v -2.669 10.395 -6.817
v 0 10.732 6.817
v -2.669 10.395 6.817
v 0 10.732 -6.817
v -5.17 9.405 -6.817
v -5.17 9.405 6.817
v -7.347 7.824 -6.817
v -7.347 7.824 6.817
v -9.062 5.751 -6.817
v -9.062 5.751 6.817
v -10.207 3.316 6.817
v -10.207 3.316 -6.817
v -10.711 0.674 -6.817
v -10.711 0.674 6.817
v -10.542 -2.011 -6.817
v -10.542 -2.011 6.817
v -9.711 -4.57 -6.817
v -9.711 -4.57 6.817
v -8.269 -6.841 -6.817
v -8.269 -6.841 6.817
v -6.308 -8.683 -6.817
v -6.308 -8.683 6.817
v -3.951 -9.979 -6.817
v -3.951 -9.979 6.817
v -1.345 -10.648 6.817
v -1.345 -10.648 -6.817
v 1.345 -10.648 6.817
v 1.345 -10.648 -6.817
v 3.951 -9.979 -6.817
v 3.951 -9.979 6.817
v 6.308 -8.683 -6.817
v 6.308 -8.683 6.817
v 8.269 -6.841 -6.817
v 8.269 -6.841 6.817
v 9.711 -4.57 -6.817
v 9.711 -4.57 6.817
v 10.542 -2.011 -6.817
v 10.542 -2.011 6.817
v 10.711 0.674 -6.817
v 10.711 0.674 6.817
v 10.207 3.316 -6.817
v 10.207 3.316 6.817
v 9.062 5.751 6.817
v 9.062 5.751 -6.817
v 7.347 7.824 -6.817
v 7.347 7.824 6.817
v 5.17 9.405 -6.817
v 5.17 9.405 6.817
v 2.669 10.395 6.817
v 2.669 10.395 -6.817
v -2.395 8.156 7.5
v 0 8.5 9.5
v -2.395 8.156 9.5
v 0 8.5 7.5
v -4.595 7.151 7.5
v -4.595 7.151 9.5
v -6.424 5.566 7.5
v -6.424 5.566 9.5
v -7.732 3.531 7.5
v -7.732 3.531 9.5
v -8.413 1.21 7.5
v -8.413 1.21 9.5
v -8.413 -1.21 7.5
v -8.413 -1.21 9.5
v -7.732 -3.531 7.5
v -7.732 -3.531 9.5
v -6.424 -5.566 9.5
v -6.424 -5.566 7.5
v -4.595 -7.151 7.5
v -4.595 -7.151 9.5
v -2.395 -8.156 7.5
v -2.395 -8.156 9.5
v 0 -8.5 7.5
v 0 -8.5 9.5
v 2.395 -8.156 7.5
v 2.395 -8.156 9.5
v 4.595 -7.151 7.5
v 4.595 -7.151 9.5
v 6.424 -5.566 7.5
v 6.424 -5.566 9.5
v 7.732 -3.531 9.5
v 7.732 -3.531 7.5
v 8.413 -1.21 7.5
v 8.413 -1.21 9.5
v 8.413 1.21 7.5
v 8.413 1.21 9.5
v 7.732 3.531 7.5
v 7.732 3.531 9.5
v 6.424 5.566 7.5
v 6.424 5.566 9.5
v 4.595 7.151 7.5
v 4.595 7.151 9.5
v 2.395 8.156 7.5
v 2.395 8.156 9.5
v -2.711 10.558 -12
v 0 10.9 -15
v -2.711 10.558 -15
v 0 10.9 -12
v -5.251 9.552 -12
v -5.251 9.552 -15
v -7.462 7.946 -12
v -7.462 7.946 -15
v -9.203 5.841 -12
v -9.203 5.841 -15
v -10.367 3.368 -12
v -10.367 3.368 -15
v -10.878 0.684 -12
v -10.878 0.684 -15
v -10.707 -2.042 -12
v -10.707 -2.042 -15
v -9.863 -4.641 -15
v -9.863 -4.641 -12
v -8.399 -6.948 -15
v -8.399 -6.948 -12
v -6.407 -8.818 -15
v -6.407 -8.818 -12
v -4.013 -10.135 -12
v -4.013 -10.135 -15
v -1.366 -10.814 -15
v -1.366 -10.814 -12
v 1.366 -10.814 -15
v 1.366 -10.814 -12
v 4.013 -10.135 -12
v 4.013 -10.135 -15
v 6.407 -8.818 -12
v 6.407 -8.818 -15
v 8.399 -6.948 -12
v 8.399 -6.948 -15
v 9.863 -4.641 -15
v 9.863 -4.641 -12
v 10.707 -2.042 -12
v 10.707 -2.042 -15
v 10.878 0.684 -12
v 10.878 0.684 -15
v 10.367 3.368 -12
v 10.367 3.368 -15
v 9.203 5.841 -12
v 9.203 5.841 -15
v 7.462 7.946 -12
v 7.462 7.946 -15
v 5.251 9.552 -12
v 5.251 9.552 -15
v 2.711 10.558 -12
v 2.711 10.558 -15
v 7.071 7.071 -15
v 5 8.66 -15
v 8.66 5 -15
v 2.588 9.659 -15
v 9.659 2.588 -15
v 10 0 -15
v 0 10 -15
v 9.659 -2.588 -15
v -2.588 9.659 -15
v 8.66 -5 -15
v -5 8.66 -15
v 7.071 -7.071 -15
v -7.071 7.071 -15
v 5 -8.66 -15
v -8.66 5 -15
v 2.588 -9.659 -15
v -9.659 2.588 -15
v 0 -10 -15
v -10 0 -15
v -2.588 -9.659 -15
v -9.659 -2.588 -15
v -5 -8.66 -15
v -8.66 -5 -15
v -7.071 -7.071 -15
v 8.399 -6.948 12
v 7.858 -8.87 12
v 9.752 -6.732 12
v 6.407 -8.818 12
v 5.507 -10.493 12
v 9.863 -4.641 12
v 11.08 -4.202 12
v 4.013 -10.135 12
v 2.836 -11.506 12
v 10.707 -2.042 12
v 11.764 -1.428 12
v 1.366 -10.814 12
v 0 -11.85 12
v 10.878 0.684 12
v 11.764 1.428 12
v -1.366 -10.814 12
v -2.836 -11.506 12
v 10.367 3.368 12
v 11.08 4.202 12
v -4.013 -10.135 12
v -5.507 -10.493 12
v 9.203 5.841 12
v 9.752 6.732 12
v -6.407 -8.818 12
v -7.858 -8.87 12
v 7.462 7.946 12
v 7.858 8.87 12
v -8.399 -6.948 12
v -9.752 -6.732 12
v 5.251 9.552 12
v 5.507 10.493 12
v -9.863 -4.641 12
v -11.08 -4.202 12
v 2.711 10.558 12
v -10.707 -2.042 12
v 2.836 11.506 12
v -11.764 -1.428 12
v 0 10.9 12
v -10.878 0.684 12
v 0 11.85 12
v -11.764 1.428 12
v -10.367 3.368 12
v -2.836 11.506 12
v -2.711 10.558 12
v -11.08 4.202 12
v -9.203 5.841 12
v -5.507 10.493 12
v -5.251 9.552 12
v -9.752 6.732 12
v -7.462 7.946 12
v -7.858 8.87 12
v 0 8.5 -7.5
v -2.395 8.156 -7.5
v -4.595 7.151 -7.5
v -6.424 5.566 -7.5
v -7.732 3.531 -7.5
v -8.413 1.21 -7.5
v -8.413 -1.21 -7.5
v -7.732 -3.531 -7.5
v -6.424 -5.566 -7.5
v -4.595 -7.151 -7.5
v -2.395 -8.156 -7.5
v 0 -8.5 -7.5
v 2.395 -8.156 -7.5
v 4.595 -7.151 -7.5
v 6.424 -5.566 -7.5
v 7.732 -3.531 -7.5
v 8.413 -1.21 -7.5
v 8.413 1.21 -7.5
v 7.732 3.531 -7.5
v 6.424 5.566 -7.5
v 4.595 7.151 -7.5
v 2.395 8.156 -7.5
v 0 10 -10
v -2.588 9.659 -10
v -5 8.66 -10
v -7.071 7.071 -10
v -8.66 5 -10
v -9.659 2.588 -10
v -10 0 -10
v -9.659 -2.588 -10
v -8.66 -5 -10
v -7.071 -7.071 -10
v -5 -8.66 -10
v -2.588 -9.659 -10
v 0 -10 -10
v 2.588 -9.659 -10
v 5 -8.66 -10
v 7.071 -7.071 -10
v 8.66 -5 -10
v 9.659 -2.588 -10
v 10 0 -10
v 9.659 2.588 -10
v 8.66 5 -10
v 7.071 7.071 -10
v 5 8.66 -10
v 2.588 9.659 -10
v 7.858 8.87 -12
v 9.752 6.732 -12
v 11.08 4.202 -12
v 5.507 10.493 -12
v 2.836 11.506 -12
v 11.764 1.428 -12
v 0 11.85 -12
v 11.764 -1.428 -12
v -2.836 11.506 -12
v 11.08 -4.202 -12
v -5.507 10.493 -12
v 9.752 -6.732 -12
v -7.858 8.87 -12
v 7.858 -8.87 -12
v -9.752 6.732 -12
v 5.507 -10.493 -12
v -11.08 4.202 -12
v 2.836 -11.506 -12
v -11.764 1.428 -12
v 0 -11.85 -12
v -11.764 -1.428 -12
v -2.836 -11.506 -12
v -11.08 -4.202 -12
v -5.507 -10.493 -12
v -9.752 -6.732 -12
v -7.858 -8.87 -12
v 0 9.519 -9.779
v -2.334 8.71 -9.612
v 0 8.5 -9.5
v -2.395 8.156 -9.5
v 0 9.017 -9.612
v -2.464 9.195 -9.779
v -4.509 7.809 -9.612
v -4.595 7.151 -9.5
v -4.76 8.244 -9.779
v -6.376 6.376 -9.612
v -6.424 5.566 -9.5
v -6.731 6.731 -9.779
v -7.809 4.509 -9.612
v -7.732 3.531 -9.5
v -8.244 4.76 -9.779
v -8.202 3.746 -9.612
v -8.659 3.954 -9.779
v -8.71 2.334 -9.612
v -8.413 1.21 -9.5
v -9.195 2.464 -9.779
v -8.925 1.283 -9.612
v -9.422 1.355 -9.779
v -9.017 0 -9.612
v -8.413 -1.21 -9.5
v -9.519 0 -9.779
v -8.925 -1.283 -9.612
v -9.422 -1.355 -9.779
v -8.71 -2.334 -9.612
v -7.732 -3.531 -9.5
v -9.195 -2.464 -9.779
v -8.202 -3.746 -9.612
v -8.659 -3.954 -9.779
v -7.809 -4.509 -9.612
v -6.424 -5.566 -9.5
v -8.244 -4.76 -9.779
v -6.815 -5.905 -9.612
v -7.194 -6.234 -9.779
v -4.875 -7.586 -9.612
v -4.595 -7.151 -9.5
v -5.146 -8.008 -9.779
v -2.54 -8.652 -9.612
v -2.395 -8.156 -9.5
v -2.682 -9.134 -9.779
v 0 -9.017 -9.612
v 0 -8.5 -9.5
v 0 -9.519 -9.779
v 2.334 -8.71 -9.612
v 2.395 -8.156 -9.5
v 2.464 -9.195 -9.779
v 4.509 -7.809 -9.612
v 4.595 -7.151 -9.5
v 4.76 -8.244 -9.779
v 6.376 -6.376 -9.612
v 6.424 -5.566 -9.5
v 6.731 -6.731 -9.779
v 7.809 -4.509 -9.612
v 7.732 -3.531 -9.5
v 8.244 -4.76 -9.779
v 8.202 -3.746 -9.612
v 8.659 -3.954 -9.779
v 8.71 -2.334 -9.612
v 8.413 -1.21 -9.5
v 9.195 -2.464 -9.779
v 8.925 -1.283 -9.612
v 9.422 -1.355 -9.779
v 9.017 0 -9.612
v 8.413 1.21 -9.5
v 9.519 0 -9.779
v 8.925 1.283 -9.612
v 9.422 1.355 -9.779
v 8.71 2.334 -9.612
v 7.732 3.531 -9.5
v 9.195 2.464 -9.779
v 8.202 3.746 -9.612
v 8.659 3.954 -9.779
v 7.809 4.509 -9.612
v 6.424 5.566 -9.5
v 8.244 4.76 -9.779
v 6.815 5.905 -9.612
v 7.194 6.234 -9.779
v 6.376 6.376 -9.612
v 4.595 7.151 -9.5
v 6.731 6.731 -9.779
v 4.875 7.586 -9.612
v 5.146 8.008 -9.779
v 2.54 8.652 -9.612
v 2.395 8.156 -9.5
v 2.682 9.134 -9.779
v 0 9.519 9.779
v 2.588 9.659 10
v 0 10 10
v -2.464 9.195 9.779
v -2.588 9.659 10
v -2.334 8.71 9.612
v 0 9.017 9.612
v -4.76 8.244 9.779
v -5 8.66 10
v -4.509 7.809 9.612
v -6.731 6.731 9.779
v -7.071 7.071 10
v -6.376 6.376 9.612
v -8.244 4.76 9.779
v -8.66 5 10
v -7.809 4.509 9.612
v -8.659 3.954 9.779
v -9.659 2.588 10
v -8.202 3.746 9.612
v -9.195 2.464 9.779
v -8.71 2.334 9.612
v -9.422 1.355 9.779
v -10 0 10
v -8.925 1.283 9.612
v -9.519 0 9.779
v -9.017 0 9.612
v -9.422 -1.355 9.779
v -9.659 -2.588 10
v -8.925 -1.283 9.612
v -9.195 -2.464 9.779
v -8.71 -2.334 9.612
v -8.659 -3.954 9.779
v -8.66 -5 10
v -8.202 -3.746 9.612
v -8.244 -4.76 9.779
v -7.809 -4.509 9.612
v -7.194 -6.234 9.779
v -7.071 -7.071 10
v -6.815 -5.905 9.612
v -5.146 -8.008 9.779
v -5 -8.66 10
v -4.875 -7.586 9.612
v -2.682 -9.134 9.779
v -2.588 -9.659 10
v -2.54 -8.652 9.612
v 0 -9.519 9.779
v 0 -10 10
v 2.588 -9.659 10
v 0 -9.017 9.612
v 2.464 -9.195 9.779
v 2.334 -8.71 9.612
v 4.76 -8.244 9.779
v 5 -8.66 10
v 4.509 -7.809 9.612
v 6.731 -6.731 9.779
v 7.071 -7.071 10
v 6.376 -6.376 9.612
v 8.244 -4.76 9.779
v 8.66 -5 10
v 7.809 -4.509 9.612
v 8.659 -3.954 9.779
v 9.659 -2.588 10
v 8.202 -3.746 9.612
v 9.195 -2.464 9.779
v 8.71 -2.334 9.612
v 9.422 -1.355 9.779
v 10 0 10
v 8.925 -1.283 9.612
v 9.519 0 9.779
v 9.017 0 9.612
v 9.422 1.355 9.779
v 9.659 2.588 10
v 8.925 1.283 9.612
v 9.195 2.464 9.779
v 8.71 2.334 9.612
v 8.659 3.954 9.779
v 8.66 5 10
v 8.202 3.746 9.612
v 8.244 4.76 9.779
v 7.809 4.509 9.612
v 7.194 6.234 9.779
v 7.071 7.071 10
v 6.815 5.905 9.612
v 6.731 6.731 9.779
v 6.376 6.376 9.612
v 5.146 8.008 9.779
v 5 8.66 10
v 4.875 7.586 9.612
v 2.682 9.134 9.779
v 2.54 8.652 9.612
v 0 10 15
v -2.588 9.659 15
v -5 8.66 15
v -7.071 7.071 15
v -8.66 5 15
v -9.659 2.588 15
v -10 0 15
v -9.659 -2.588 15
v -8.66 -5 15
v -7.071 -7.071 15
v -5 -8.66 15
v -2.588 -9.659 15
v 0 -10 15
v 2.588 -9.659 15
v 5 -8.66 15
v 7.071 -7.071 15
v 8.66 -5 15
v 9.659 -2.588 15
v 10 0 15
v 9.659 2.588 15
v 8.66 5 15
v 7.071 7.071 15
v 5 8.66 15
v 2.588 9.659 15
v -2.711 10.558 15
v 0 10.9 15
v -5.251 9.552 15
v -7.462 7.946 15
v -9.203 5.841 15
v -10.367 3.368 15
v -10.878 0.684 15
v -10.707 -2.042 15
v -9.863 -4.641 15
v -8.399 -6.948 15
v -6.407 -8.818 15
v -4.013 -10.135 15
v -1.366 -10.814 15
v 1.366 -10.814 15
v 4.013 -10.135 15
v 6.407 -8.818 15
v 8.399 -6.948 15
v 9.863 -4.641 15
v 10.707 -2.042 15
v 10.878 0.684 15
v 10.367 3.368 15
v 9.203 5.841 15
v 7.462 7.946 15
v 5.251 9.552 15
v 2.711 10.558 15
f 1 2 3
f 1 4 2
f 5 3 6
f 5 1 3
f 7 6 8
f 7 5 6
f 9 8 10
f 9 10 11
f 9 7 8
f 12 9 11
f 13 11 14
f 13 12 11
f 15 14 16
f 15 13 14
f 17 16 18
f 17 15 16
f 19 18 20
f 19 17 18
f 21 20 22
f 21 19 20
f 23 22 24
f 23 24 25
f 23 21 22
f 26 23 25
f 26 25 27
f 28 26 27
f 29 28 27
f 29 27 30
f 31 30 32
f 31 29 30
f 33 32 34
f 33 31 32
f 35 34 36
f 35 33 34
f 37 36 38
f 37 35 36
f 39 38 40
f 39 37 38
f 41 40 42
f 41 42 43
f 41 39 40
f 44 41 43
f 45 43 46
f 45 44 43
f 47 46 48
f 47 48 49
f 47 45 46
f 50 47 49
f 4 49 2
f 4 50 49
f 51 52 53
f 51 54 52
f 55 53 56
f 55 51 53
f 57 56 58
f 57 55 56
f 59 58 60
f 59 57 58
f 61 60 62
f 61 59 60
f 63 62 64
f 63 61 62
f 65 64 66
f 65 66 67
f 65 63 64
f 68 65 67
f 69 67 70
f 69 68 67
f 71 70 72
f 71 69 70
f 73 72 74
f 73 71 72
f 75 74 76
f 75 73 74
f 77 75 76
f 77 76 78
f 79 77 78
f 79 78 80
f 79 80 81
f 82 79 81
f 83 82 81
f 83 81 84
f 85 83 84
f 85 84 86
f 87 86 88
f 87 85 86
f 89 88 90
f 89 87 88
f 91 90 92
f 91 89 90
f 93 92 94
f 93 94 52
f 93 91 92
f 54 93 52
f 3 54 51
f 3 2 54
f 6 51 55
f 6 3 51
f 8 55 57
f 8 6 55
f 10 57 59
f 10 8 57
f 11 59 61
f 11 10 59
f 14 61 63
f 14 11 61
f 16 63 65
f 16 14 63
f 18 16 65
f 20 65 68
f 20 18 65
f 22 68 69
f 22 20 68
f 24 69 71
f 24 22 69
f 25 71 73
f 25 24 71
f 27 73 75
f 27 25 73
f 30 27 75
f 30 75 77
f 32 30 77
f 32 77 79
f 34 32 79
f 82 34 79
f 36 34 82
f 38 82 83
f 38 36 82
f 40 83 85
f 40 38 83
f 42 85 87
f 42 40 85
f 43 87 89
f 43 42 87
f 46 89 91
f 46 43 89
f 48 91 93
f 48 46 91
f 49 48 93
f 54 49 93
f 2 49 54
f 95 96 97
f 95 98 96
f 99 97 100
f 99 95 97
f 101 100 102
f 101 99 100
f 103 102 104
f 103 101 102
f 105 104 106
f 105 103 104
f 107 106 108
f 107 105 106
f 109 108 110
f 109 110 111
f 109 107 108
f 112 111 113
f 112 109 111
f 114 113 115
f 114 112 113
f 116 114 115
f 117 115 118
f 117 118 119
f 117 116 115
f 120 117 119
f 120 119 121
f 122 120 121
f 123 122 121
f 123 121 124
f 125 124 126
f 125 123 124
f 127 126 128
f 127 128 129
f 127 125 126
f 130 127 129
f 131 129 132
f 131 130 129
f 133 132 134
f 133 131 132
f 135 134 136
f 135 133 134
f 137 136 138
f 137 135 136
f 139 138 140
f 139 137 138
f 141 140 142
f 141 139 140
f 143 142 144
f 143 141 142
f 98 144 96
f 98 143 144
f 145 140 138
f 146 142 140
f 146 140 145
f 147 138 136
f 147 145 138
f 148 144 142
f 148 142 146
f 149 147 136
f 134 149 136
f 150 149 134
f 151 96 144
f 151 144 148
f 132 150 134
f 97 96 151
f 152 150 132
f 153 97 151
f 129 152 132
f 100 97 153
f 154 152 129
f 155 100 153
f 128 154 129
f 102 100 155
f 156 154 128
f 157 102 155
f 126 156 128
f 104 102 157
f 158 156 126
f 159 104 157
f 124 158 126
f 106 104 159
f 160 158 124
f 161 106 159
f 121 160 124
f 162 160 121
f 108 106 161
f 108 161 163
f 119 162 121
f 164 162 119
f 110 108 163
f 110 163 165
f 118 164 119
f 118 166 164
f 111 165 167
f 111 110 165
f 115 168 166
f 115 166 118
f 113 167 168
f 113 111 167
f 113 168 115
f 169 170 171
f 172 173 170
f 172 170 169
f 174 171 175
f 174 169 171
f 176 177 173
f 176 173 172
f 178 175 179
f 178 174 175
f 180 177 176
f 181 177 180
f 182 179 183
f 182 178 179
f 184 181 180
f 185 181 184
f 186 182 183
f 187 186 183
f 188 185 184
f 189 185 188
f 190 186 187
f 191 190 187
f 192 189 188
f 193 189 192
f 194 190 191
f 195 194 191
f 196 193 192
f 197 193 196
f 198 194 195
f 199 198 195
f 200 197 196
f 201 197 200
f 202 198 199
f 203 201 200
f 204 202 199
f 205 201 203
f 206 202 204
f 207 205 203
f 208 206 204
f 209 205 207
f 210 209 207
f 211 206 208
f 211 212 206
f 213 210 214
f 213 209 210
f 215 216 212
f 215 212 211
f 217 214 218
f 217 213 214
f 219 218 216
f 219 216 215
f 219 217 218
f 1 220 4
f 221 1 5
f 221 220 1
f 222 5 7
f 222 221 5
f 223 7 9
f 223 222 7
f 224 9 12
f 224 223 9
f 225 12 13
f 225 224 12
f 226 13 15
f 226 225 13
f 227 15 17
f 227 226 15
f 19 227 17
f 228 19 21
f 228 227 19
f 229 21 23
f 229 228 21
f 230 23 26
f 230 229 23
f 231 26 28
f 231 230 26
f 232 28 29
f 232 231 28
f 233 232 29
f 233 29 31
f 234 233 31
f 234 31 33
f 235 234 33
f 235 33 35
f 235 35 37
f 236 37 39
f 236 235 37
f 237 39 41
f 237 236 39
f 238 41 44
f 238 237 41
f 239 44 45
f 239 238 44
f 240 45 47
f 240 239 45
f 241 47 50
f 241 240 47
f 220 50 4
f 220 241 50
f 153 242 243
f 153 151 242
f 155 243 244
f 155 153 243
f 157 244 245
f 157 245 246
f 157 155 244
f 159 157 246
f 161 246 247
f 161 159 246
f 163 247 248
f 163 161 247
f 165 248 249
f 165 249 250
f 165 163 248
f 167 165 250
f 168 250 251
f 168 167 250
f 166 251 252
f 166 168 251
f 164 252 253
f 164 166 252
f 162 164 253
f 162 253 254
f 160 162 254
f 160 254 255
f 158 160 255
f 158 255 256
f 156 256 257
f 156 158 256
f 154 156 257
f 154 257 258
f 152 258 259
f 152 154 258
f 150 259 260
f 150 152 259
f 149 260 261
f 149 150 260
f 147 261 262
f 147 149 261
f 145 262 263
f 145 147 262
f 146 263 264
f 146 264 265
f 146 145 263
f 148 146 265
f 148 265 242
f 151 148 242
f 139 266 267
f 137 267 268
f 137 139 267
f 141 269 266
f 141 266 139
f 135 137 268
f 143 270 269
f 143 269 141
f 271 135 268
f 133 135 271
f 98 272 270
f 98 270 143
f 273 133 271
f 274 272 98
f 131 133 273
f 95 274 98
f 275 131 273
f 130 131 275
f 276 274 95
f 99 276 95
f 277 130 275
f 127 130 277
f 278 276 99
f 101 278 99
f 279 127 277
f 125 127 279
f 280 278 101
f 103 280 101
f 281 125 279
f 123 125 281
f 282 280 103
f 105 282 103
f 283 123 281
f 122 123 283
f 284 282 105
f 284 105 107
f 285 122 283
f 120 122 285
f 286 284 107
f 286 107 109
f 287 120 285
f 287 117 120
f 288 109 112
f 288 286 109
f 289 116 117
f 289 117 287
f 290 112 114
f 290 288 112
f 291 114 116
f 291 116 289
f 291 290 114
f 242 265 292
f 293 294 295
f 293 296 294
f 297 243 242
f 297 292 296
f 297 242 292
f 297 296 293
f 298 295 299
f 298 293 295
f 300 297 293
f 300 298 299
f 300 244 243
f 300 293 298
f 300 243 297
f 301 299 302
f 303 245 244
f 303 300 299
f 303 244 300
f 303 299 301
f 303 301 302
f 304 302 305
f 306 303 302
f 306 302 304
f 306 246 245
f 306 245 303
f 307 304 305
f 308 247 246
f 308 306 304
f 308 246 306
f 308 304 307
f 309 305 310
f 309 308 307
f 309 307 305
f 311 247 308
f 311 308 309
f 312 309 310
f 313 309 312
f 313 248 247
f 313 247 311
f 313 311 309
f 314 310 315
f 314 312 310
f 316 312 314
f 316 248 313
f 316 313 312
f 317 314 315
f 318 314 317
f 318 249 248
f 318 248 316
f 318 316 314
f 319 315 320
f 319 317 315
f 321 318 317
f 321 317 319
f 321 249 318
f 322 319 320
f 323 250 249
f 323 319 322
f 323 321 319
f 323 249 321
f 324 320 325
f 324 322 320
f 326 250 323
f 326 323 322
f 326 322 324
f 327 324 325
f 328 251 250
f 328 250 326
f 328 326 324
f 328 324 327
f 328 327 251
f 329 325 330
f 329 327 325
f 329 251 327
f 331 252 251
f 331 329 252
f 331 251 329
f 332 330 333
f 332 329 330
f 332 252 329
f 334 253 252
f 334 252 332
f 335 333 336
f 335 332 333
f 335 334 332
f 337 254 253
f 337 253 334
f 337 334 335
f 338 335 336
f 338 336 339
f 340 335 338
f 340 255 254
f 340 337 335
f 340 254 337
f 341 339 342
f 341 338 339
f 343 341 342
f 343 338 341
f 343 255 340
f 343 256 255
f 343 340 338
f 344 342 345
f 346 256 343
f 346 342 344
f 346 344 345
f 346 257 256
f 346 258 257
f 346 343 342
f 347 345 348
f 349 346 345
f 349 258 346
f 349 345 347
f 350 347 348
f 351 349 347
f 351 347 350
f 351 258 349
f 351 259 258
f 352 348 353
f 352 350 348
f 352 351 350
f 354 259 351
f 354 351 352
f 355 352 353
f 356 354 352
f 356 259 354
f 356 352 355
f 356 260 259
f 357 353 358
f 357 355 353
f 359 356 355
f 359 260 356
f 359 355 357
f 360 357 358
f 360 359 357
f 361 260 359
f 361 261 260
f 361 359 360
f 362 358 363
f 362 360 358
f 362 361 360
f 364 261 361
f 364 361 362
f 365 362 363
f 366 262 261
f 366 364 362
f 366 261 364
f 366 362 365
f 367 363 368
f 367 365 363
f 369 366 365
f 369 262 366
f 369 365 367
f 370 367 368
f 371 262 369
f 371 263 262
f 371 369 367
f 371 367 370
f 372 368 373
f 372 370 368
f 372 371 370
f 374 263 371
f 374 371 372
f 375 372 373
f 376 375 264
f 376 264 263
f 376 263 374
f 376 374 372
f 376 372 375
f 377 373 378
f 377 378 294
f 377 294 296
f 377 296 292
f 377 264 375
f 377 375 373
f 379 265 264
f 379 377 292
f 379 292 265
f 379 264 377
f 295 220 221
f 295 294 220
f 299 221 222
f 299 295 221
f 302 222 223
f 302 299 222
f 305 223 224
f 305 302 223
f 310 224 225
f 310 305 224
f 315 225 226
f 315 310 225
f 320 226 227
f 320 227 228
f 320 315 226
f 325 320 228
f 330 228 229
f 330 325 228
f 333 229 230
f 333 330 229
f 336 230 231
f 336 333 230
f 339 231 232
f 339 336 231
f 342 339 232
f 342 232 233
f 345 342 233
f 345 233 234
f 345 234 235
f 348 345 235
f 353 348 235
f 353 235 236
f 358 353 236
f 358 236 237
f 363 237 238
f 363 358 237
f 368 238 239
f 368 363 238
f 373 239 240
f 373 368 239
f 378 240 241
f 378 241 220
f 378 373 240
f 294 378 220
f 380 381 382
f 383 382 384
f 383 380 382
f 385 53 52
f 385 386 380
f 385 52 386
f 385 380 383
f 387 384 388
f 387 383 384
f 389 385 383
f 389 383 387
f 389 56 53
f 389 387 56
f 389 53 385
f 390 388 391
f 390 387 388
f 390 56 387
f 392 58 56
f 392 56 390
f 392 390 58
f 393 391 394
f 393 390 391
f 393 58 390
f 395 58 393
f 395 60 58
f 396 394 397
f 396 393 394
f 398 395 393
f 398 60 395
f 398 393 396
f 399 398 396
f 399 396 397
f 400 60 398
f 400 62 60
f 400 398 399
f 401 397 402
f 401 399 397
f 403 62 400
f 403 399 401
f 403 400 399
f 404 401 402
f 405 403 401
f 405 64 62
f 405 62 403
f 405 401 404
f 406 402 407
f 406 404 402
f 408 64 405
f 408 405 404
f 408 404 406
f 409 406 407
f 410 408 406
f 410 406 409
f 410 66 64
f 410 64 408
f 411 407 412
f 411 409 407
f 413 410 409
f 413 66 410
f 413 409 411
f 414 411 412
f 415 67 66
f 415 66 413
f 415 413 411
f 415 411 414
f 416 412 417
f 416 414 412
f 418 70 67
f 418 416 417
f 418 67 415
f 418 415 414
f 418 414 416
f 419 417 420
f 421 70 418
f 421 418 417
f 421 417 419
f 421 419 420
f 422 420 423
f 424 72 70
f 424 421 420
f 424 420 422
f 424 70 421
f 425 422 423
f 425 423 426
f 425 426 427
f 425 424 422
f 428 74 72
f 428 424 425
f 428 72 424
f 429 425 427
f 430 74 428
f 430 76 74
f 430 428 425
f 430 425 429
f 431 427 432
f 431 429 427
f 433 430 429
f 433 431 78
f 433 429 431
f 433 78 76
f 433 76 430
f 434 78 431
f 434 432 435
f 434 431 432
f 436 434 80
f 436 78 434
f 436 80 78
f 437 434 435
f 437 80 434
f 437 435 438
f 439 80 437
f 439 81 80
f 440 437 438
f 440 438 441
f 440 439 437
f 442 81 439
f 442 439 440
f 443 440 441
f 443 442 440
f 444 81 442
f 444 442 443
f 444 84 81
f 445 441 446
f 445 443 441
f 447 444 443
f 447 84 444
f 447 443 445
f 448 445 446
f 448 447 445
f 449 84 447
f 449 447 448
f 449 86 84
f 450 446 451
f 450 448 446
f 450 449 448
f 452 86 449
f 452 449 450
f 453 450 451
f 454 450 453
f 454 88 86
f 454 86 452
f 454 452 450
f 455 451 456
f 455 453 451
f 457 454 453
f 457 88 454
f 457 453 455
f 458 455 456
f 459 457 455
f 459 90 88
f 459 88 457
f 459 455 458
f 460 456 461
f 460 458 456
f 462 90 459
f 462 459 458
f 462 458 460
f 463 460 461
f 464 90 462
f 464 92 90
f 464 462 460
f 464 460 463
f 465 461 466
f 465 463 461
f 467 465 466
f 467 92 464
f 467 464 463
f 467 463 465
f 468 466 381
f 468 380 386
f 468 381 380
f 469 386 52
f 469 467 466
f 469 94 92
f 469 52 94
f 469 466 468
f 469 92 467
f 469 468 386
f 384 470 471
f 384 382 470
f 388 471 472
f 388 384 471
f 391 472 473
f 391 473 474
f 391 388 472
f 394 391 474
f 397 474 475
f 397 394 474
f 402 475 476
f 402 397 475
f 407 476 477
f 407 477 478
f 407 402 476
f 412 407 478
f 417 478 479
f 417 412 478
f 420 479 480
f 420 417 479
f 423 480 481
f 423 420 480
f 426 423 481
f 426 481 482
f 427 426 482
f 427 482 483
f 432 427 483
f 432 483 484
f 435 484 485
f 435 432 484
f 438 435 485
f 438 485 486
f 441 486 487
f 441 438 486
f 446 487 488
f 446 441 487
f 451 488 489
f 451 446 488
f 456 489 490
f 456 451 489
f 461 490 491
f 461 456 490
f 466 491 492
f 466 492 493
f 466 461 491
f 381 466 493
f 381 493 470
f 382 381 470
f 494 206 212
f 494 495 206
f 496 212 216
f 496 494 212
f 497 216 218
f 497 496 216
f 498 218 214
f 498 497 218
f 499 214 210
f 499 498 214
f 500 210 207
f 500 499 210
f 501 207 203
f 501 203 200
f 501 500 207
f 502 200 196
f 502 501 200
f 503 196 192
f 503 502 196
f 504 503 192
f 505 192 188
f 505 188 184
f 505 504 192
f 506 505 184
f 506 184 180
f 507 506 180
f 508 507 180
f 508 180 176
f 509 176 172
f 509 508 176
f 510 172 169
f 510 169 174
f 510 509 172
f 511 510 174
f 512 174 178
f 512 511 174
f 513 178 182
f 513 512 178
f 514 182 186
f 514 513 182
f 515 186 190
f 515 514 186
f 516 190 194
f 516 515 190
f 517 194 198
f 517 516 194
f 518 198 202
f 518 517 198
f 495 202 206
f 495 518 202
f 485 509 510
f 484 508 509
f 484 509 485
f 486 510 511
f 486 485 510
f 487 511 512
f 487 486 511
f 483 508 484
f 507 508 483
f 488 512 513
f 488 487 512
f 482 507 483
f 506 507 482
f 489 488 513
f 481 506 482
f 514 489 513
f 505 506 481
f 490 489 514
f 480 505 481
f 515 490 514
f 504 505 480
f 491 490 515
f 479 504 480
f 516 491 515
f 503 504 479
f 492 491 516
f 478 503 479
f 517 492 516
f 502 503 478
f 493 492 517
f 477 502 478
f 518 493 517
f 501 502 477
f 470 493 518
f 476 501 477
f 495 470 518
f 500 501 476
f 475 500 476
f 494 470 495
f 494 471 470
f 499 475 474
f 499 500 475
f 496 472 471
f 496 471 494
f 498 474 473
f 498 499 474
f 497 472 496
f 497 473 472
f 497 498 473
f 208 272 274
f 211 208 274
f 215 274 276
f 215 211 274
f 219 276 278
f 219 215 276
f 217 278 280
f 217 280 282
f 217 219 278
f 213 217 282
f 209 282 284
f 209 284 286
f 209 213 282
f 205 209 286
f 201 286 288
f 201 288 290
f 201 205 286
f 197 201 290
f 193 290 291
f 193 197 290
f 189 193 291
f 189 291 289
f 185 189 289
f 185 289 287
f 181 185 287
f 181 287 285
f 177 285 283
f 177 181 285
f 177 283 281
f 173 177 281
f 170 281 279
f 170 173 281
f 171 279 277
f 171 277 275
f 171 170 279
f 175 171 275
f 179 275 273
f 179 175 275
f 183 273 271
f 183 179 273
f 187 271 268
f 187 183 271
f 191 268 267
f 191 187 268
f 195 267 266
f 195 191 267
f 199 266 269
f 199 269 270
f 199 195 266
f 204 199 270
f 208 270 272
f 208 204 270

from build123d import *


with BuildPart() as part:
    # 스케치1 → 회전1 (revolve)
    with BuildSketch(Plane(origin=(0, 0, 0), x_dir=(0, 0, -1), z_dir=(1, 0, 0))):
        with BuildLine():
            Line((12, 11.85), (-12, 11.85))
            Line((-12, 11.85), (-12, 10.9))
            Line((-12, 10.9), (-15, 10.9))
            Line((-15, 10.9), (-15, 10))
            Line((-15, 10), (-10, 10))
            ThreePointArc((-10, 10), (-9.688420677, 9.270526441), (-9.5, 8.5))
            Line((-9.5, 8.5), (-7.5, 8.5))
            Line((-7.5, 8.5), (-6.817399349, 10.732369836))
            Line((-6.817399349, 10.732369836), (6.817399349, 10.732369836))
            Line((6.817399349, 10.732369836), (7.5, 8.5))
            Line((7.5, 8.5), (9.5, 8.5))
            ThreePointArc((9.5, 8.5), (9.688420677, 9.270526441), (10, 10))
            Line((10, 10), (15, 10))
            Line((15, 10), (15, 10.9))
            Line((15, 10.9), (12, 10.9))
            Line((12, 10.9), (12, 11.85))
        make_face()
    revolve(axis=Axis((0, 0, 0), (0, 0, 1)))


solid = part.part
